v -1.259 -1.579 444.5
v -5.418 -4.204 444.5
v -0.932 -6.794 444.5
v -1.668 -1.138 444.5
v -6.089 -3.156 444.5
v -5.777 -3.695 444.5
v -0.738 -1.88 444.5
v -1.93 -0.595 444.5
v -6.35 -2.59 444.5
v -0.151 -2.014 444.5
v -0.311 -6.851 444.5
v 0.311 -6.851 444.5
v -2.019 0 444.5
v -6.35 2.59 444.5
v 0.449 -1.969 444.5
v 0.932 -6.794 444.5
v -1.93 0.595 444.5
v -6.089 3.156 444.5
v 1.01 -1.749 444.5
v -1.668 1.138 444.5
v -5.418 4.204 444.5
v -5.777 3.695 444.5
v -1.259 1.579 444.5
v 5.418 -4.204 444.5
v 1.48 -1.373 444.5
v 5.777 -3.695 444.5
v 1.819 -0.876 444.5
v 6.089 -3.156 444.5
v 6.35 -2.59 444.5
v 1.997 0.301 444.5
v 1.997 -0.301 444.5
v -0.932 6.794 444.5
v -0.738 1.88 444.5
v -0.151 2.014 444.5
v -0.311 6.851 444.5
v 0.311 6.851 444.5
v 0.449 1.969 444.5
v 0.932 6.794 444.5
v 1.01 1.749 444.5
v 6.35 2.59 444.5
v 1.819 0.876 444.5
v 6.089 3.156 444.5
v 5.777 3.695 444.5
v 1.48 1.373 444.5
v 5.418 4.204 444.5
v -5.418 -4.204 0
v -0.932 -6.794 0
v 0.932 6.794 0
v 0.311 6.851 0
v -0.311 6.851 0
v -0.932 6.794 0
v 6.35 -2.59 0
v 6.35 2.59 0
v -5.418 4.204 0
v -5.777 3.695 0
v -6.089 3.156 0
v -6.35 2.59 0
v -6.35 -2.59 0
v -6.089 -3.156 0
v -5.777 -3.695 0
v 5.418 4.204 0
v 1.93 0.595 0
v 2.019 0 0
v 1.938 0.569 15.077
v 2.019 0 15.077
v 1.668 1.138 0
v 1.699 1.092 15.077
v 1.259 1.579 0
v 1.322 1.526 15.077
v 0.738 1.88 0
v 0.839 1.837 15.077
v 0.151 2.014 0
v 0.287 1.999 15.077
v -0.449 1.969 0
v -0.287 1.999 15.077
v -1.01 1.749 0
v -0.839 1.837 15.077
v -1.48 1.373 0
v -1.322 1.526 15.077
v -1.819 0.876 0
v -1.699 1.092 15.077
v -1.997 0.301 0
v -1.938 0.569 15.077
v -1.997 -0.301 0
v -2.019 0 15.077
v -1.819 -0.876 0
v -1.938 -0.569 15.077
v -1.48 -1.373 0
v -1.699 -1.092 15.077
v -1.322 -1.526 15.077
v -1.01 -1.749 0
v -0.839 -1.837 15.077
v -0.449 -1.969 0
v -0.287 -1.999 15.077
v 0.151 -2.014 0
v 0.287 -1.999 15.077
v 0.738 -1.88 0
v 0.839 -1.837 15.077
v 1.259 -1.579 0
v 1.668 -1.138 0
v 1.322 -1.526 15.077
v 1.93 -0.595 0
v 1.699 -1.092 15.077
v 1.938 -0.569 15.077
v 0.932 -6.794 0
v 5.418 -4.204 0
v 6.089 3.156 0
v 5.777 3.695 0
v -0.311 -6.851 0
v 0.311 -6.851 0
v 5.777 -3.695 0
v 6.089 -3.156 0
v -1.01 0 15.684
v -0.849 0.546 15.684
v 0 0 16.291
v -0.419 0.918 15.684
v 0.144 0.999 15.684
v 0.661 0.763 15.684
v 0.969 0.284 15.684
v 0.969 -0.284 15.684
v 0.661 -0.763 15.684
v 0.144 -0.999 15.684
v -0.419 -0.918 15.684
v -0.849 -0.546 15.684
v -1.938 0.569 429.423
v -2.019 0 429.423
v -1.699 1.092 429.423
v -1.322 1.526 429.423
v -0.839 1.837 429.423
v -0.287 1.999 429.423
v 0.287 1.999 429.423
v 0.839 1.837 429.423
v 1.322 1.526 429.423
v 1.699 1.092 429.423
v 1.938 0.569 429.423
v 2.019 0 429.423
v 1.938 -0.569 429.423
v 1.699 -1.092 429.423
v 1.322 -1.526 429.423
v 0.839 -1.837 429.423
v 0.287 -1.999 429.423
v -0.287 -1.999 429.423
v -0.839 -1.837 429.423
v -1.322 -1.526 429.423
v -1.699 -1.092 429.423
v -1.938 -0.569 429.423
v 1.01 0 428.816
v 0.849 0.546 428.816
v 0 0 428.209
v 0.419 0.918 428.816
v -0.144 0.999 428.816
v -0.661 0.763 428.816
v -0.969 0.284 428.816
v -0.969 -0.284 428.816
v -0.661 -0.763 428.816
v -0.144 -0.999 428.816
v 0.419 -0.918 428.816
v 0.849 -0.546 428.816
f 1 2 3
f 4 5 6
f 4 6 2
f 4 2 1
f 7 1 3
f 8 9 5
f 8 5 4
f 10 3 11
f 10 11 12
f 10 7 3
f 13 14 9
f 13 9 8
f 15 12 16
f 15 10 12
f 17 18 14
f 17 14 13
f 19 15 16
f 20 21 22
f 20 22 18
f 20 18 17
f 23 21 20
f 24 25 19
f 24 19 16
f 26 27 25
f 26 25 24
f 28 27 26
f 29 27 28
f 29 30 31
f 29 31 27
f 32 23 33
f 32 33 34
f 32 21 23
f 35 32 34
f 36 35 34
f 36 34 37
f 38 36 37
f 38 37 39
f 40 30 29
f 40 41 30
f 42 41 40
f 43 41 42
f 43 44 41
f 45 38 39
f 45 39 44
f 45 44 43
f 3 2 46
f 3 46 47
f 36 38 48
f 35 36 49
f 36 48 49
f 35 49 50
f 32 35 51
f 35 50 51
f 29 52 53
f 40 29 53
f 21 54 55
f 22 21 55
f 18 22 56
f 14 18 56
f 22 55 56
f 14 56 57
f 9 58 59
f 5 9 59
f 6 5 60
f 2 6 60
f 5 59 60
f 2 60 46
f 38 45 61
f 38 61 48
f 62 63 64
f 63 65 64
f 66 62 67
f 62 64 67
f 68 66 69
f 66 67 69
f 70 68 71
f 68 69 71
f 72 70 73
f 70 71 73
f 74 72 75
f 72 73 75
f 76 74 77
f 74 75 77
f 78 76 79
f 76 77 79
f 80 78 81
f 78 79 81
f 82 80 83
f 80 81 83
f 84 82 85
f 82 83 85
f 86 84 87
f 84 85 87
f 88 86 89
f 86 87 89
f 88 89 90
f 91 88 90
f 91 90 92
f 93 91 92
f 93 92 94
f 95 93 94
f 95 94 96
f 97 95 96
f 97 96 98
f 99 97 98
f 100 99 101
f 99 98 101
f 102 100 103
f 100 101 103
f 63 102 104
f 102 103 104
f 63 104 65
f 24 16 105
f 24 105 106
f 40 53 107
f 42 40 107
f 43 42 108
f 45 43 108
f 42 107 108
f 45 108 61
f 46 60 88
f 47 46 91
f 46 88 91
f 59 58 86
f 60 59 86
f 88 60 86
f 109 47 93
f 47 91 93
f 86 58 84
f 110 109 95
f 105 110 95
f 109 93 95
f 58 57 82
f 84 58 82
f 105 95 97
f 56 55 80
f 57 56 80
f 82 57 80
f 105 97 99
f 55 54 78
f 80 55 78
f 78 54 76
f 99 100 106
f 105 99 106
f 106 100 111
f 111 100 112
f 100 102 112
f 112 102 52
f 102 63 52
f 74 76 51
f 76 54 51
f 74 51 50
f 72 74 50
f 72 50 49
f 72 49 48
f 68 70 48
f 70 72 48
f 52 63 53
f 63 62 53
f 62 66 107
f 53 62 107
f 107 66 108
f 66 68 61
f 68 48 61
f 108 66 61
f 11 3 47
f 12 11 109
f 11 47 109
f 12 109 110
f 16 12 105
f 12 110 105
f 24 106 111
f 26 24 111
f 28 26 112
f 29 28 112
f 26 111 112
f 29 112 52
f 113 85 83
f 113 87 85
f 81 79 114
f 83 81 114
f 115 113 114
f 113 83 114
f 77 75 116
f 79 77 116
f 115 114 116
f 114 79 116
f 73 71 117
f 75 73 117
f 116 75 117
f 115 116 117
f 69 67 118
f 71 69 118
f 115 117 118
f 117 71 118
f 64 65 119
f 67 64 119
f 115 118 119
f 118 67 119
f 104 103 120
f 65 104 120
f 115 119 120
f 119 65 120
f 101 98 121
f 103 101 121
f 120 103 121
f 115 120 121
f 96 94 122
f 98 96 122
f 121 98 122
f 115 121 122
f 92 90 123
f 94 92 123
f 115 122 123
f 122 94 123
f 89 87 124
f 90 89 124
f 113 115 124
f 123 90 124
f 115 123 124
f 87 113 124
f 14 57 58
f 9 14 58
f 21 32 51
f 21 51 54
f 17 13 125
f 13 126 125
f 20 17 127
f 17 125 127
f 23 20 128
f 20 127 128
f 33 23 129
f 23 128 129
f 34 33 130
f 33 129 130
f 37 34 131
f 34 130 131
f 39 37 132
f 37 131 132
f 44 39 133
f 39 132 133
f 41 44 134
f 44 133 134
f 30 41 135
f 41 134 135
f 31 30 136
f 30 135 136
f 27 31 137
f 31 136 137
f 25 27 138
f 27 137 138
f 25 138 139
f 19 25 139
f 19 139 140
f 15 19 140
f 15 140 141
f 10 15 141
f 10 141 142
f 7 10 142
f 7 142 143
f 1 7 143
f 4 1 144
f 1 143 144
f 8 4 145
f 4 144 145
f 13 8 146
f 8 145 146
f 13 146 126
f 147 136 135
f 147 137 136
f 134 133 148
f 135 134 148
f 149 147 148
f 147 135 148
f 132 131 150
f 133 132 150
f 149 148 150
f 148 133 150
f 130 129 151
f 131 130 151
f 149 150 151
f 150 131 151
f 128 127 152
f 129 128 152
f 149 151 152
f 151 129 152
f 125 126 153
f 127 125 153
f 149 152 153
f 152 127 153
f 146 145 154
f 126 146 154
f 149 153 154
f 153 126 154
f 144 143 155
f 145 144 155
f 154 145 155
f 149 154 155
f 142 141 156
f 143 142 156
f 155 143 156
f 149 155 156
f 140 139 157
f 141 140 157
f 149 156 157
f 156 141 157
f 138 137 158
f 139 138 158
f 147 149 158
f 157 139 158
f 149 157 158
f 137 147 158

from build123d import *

# Parameters (mm, degrees)
BOSS_EXTRUDE1_DEPTH                  = 444.5
F_10_32_TAPPED_HOLE1_D               = 4.0386
F_10_32_TAPPED_HOLE1_DEPTH           = 15.07744
F_10_32_TAPPED_HOLE1_TIP             = 1.213317848
F_10_32_TAPPED_HOLE1_ON_FACE_2_D     = 4.0386
F_10_32_TAPPED_HOLE1_ON_FACE_2_DEPTH = 15.07744
F_10_32_TAPPED_HOLE1_ON_FACE_2_TIP   = 1.213317848


with BuildPart() as part:
    # Sketch1 → Boss-Extrude1 (new body)
    with BuildSketch(Plane.XY):
        with BuildLine():
            ThreePointArc((6.35, 2.590301913), (5.939202219, 3.429), (5.41826726, 4.204110358))
            Line((5.41826726, 4.204110358), (0.93173274, 6.79441227))
            ThreePointArc((0.93173274, 6.79441227), (0, 6.858), (-0.93173274, 6.79441227))
            Line((-0.93173274, 6.79441227), (-5.41826726, 4.204110358))
            ThreePointArc((-5.41826726, 4.204110358), (-5.939202219, 3.429), (-6.35, 2.590301913))
            Line((-6.35, 2.590301913), (-6.35, -2.590301913))
            ThreePointArc((-6.35, -2.590301913), (-5.939202219, -3.429), (-5.41826726, -4.204110358))
            Line((-5.41826726, -4.204110358), (-0.93173274, -6.79441227))
            ThreePointArc((-0.93173274, -6.79441227), (0, -6.858), (0.93173274, -6.79441227))
            Line((0.93173274, -6.79441227), (5.41826726, -4.204110358))
            ThreePointArc((5.41826726, -4.204110358), (5.939202219, -3.429), (6.35, -2.590301913))
            Line((6.35, -2.590301913), (6.35, 2.590301913))
        make_face()
    extrude(amount=BOSS_EXTRUDE1_DEPTH)

    # #10-32 Tapped Hole1
    with Locations(Plane.XY.offset(444.5)):
        with Locations((0, 0)):
            Hole(F_10_32_TAPPED_HOLE1_D / 2, depth=F_10_32_TAPPED_HOLE1_DEPTH)
            with Locations((0, 0, -(F_10_32_TAPPED_HOLE1_DEPTH + F_10_32_TAPPED_HOLE1_TIP / 2))):  # 118° drill point
                Cone(0, F_10_32_TAPPED_HOLE1_D / 2, F_10_32_TAPPED_HOLE1_TIP, mode=Mode.SUBTRACT)

    # #10-32 Tapped Hole1 on face 2
    with Locations(Plane(origin=(0, 0, 0), x_dir=(-1, 0, 0), z_dir=(0, 0, -1))):
        with Locations((0, 0)):
            Hole(F_10_32_TAPPED_HOLE1_ON_FACE_2_D / 2, depth=F_10_32_TAPPED_HOLE1_ON_FACE_2_DEPTH)
            with Locations((0, 0, -(F_10_32_TAPPED_HOLE1_ON_FACE_2_DEPTH + F_10_32_TAPPED_HOLE1_ON_FACE_2_TIP / 2))):  # 118° drill point
                Cone(0, F_10_32_TAPPED_HOLE1_ON_FACE_2_D / 2, F_10_32_TAPPED_HOLE1_ON_FACE_2_TIP, mode=Mode.SUBTRACT)


solid = part.part
